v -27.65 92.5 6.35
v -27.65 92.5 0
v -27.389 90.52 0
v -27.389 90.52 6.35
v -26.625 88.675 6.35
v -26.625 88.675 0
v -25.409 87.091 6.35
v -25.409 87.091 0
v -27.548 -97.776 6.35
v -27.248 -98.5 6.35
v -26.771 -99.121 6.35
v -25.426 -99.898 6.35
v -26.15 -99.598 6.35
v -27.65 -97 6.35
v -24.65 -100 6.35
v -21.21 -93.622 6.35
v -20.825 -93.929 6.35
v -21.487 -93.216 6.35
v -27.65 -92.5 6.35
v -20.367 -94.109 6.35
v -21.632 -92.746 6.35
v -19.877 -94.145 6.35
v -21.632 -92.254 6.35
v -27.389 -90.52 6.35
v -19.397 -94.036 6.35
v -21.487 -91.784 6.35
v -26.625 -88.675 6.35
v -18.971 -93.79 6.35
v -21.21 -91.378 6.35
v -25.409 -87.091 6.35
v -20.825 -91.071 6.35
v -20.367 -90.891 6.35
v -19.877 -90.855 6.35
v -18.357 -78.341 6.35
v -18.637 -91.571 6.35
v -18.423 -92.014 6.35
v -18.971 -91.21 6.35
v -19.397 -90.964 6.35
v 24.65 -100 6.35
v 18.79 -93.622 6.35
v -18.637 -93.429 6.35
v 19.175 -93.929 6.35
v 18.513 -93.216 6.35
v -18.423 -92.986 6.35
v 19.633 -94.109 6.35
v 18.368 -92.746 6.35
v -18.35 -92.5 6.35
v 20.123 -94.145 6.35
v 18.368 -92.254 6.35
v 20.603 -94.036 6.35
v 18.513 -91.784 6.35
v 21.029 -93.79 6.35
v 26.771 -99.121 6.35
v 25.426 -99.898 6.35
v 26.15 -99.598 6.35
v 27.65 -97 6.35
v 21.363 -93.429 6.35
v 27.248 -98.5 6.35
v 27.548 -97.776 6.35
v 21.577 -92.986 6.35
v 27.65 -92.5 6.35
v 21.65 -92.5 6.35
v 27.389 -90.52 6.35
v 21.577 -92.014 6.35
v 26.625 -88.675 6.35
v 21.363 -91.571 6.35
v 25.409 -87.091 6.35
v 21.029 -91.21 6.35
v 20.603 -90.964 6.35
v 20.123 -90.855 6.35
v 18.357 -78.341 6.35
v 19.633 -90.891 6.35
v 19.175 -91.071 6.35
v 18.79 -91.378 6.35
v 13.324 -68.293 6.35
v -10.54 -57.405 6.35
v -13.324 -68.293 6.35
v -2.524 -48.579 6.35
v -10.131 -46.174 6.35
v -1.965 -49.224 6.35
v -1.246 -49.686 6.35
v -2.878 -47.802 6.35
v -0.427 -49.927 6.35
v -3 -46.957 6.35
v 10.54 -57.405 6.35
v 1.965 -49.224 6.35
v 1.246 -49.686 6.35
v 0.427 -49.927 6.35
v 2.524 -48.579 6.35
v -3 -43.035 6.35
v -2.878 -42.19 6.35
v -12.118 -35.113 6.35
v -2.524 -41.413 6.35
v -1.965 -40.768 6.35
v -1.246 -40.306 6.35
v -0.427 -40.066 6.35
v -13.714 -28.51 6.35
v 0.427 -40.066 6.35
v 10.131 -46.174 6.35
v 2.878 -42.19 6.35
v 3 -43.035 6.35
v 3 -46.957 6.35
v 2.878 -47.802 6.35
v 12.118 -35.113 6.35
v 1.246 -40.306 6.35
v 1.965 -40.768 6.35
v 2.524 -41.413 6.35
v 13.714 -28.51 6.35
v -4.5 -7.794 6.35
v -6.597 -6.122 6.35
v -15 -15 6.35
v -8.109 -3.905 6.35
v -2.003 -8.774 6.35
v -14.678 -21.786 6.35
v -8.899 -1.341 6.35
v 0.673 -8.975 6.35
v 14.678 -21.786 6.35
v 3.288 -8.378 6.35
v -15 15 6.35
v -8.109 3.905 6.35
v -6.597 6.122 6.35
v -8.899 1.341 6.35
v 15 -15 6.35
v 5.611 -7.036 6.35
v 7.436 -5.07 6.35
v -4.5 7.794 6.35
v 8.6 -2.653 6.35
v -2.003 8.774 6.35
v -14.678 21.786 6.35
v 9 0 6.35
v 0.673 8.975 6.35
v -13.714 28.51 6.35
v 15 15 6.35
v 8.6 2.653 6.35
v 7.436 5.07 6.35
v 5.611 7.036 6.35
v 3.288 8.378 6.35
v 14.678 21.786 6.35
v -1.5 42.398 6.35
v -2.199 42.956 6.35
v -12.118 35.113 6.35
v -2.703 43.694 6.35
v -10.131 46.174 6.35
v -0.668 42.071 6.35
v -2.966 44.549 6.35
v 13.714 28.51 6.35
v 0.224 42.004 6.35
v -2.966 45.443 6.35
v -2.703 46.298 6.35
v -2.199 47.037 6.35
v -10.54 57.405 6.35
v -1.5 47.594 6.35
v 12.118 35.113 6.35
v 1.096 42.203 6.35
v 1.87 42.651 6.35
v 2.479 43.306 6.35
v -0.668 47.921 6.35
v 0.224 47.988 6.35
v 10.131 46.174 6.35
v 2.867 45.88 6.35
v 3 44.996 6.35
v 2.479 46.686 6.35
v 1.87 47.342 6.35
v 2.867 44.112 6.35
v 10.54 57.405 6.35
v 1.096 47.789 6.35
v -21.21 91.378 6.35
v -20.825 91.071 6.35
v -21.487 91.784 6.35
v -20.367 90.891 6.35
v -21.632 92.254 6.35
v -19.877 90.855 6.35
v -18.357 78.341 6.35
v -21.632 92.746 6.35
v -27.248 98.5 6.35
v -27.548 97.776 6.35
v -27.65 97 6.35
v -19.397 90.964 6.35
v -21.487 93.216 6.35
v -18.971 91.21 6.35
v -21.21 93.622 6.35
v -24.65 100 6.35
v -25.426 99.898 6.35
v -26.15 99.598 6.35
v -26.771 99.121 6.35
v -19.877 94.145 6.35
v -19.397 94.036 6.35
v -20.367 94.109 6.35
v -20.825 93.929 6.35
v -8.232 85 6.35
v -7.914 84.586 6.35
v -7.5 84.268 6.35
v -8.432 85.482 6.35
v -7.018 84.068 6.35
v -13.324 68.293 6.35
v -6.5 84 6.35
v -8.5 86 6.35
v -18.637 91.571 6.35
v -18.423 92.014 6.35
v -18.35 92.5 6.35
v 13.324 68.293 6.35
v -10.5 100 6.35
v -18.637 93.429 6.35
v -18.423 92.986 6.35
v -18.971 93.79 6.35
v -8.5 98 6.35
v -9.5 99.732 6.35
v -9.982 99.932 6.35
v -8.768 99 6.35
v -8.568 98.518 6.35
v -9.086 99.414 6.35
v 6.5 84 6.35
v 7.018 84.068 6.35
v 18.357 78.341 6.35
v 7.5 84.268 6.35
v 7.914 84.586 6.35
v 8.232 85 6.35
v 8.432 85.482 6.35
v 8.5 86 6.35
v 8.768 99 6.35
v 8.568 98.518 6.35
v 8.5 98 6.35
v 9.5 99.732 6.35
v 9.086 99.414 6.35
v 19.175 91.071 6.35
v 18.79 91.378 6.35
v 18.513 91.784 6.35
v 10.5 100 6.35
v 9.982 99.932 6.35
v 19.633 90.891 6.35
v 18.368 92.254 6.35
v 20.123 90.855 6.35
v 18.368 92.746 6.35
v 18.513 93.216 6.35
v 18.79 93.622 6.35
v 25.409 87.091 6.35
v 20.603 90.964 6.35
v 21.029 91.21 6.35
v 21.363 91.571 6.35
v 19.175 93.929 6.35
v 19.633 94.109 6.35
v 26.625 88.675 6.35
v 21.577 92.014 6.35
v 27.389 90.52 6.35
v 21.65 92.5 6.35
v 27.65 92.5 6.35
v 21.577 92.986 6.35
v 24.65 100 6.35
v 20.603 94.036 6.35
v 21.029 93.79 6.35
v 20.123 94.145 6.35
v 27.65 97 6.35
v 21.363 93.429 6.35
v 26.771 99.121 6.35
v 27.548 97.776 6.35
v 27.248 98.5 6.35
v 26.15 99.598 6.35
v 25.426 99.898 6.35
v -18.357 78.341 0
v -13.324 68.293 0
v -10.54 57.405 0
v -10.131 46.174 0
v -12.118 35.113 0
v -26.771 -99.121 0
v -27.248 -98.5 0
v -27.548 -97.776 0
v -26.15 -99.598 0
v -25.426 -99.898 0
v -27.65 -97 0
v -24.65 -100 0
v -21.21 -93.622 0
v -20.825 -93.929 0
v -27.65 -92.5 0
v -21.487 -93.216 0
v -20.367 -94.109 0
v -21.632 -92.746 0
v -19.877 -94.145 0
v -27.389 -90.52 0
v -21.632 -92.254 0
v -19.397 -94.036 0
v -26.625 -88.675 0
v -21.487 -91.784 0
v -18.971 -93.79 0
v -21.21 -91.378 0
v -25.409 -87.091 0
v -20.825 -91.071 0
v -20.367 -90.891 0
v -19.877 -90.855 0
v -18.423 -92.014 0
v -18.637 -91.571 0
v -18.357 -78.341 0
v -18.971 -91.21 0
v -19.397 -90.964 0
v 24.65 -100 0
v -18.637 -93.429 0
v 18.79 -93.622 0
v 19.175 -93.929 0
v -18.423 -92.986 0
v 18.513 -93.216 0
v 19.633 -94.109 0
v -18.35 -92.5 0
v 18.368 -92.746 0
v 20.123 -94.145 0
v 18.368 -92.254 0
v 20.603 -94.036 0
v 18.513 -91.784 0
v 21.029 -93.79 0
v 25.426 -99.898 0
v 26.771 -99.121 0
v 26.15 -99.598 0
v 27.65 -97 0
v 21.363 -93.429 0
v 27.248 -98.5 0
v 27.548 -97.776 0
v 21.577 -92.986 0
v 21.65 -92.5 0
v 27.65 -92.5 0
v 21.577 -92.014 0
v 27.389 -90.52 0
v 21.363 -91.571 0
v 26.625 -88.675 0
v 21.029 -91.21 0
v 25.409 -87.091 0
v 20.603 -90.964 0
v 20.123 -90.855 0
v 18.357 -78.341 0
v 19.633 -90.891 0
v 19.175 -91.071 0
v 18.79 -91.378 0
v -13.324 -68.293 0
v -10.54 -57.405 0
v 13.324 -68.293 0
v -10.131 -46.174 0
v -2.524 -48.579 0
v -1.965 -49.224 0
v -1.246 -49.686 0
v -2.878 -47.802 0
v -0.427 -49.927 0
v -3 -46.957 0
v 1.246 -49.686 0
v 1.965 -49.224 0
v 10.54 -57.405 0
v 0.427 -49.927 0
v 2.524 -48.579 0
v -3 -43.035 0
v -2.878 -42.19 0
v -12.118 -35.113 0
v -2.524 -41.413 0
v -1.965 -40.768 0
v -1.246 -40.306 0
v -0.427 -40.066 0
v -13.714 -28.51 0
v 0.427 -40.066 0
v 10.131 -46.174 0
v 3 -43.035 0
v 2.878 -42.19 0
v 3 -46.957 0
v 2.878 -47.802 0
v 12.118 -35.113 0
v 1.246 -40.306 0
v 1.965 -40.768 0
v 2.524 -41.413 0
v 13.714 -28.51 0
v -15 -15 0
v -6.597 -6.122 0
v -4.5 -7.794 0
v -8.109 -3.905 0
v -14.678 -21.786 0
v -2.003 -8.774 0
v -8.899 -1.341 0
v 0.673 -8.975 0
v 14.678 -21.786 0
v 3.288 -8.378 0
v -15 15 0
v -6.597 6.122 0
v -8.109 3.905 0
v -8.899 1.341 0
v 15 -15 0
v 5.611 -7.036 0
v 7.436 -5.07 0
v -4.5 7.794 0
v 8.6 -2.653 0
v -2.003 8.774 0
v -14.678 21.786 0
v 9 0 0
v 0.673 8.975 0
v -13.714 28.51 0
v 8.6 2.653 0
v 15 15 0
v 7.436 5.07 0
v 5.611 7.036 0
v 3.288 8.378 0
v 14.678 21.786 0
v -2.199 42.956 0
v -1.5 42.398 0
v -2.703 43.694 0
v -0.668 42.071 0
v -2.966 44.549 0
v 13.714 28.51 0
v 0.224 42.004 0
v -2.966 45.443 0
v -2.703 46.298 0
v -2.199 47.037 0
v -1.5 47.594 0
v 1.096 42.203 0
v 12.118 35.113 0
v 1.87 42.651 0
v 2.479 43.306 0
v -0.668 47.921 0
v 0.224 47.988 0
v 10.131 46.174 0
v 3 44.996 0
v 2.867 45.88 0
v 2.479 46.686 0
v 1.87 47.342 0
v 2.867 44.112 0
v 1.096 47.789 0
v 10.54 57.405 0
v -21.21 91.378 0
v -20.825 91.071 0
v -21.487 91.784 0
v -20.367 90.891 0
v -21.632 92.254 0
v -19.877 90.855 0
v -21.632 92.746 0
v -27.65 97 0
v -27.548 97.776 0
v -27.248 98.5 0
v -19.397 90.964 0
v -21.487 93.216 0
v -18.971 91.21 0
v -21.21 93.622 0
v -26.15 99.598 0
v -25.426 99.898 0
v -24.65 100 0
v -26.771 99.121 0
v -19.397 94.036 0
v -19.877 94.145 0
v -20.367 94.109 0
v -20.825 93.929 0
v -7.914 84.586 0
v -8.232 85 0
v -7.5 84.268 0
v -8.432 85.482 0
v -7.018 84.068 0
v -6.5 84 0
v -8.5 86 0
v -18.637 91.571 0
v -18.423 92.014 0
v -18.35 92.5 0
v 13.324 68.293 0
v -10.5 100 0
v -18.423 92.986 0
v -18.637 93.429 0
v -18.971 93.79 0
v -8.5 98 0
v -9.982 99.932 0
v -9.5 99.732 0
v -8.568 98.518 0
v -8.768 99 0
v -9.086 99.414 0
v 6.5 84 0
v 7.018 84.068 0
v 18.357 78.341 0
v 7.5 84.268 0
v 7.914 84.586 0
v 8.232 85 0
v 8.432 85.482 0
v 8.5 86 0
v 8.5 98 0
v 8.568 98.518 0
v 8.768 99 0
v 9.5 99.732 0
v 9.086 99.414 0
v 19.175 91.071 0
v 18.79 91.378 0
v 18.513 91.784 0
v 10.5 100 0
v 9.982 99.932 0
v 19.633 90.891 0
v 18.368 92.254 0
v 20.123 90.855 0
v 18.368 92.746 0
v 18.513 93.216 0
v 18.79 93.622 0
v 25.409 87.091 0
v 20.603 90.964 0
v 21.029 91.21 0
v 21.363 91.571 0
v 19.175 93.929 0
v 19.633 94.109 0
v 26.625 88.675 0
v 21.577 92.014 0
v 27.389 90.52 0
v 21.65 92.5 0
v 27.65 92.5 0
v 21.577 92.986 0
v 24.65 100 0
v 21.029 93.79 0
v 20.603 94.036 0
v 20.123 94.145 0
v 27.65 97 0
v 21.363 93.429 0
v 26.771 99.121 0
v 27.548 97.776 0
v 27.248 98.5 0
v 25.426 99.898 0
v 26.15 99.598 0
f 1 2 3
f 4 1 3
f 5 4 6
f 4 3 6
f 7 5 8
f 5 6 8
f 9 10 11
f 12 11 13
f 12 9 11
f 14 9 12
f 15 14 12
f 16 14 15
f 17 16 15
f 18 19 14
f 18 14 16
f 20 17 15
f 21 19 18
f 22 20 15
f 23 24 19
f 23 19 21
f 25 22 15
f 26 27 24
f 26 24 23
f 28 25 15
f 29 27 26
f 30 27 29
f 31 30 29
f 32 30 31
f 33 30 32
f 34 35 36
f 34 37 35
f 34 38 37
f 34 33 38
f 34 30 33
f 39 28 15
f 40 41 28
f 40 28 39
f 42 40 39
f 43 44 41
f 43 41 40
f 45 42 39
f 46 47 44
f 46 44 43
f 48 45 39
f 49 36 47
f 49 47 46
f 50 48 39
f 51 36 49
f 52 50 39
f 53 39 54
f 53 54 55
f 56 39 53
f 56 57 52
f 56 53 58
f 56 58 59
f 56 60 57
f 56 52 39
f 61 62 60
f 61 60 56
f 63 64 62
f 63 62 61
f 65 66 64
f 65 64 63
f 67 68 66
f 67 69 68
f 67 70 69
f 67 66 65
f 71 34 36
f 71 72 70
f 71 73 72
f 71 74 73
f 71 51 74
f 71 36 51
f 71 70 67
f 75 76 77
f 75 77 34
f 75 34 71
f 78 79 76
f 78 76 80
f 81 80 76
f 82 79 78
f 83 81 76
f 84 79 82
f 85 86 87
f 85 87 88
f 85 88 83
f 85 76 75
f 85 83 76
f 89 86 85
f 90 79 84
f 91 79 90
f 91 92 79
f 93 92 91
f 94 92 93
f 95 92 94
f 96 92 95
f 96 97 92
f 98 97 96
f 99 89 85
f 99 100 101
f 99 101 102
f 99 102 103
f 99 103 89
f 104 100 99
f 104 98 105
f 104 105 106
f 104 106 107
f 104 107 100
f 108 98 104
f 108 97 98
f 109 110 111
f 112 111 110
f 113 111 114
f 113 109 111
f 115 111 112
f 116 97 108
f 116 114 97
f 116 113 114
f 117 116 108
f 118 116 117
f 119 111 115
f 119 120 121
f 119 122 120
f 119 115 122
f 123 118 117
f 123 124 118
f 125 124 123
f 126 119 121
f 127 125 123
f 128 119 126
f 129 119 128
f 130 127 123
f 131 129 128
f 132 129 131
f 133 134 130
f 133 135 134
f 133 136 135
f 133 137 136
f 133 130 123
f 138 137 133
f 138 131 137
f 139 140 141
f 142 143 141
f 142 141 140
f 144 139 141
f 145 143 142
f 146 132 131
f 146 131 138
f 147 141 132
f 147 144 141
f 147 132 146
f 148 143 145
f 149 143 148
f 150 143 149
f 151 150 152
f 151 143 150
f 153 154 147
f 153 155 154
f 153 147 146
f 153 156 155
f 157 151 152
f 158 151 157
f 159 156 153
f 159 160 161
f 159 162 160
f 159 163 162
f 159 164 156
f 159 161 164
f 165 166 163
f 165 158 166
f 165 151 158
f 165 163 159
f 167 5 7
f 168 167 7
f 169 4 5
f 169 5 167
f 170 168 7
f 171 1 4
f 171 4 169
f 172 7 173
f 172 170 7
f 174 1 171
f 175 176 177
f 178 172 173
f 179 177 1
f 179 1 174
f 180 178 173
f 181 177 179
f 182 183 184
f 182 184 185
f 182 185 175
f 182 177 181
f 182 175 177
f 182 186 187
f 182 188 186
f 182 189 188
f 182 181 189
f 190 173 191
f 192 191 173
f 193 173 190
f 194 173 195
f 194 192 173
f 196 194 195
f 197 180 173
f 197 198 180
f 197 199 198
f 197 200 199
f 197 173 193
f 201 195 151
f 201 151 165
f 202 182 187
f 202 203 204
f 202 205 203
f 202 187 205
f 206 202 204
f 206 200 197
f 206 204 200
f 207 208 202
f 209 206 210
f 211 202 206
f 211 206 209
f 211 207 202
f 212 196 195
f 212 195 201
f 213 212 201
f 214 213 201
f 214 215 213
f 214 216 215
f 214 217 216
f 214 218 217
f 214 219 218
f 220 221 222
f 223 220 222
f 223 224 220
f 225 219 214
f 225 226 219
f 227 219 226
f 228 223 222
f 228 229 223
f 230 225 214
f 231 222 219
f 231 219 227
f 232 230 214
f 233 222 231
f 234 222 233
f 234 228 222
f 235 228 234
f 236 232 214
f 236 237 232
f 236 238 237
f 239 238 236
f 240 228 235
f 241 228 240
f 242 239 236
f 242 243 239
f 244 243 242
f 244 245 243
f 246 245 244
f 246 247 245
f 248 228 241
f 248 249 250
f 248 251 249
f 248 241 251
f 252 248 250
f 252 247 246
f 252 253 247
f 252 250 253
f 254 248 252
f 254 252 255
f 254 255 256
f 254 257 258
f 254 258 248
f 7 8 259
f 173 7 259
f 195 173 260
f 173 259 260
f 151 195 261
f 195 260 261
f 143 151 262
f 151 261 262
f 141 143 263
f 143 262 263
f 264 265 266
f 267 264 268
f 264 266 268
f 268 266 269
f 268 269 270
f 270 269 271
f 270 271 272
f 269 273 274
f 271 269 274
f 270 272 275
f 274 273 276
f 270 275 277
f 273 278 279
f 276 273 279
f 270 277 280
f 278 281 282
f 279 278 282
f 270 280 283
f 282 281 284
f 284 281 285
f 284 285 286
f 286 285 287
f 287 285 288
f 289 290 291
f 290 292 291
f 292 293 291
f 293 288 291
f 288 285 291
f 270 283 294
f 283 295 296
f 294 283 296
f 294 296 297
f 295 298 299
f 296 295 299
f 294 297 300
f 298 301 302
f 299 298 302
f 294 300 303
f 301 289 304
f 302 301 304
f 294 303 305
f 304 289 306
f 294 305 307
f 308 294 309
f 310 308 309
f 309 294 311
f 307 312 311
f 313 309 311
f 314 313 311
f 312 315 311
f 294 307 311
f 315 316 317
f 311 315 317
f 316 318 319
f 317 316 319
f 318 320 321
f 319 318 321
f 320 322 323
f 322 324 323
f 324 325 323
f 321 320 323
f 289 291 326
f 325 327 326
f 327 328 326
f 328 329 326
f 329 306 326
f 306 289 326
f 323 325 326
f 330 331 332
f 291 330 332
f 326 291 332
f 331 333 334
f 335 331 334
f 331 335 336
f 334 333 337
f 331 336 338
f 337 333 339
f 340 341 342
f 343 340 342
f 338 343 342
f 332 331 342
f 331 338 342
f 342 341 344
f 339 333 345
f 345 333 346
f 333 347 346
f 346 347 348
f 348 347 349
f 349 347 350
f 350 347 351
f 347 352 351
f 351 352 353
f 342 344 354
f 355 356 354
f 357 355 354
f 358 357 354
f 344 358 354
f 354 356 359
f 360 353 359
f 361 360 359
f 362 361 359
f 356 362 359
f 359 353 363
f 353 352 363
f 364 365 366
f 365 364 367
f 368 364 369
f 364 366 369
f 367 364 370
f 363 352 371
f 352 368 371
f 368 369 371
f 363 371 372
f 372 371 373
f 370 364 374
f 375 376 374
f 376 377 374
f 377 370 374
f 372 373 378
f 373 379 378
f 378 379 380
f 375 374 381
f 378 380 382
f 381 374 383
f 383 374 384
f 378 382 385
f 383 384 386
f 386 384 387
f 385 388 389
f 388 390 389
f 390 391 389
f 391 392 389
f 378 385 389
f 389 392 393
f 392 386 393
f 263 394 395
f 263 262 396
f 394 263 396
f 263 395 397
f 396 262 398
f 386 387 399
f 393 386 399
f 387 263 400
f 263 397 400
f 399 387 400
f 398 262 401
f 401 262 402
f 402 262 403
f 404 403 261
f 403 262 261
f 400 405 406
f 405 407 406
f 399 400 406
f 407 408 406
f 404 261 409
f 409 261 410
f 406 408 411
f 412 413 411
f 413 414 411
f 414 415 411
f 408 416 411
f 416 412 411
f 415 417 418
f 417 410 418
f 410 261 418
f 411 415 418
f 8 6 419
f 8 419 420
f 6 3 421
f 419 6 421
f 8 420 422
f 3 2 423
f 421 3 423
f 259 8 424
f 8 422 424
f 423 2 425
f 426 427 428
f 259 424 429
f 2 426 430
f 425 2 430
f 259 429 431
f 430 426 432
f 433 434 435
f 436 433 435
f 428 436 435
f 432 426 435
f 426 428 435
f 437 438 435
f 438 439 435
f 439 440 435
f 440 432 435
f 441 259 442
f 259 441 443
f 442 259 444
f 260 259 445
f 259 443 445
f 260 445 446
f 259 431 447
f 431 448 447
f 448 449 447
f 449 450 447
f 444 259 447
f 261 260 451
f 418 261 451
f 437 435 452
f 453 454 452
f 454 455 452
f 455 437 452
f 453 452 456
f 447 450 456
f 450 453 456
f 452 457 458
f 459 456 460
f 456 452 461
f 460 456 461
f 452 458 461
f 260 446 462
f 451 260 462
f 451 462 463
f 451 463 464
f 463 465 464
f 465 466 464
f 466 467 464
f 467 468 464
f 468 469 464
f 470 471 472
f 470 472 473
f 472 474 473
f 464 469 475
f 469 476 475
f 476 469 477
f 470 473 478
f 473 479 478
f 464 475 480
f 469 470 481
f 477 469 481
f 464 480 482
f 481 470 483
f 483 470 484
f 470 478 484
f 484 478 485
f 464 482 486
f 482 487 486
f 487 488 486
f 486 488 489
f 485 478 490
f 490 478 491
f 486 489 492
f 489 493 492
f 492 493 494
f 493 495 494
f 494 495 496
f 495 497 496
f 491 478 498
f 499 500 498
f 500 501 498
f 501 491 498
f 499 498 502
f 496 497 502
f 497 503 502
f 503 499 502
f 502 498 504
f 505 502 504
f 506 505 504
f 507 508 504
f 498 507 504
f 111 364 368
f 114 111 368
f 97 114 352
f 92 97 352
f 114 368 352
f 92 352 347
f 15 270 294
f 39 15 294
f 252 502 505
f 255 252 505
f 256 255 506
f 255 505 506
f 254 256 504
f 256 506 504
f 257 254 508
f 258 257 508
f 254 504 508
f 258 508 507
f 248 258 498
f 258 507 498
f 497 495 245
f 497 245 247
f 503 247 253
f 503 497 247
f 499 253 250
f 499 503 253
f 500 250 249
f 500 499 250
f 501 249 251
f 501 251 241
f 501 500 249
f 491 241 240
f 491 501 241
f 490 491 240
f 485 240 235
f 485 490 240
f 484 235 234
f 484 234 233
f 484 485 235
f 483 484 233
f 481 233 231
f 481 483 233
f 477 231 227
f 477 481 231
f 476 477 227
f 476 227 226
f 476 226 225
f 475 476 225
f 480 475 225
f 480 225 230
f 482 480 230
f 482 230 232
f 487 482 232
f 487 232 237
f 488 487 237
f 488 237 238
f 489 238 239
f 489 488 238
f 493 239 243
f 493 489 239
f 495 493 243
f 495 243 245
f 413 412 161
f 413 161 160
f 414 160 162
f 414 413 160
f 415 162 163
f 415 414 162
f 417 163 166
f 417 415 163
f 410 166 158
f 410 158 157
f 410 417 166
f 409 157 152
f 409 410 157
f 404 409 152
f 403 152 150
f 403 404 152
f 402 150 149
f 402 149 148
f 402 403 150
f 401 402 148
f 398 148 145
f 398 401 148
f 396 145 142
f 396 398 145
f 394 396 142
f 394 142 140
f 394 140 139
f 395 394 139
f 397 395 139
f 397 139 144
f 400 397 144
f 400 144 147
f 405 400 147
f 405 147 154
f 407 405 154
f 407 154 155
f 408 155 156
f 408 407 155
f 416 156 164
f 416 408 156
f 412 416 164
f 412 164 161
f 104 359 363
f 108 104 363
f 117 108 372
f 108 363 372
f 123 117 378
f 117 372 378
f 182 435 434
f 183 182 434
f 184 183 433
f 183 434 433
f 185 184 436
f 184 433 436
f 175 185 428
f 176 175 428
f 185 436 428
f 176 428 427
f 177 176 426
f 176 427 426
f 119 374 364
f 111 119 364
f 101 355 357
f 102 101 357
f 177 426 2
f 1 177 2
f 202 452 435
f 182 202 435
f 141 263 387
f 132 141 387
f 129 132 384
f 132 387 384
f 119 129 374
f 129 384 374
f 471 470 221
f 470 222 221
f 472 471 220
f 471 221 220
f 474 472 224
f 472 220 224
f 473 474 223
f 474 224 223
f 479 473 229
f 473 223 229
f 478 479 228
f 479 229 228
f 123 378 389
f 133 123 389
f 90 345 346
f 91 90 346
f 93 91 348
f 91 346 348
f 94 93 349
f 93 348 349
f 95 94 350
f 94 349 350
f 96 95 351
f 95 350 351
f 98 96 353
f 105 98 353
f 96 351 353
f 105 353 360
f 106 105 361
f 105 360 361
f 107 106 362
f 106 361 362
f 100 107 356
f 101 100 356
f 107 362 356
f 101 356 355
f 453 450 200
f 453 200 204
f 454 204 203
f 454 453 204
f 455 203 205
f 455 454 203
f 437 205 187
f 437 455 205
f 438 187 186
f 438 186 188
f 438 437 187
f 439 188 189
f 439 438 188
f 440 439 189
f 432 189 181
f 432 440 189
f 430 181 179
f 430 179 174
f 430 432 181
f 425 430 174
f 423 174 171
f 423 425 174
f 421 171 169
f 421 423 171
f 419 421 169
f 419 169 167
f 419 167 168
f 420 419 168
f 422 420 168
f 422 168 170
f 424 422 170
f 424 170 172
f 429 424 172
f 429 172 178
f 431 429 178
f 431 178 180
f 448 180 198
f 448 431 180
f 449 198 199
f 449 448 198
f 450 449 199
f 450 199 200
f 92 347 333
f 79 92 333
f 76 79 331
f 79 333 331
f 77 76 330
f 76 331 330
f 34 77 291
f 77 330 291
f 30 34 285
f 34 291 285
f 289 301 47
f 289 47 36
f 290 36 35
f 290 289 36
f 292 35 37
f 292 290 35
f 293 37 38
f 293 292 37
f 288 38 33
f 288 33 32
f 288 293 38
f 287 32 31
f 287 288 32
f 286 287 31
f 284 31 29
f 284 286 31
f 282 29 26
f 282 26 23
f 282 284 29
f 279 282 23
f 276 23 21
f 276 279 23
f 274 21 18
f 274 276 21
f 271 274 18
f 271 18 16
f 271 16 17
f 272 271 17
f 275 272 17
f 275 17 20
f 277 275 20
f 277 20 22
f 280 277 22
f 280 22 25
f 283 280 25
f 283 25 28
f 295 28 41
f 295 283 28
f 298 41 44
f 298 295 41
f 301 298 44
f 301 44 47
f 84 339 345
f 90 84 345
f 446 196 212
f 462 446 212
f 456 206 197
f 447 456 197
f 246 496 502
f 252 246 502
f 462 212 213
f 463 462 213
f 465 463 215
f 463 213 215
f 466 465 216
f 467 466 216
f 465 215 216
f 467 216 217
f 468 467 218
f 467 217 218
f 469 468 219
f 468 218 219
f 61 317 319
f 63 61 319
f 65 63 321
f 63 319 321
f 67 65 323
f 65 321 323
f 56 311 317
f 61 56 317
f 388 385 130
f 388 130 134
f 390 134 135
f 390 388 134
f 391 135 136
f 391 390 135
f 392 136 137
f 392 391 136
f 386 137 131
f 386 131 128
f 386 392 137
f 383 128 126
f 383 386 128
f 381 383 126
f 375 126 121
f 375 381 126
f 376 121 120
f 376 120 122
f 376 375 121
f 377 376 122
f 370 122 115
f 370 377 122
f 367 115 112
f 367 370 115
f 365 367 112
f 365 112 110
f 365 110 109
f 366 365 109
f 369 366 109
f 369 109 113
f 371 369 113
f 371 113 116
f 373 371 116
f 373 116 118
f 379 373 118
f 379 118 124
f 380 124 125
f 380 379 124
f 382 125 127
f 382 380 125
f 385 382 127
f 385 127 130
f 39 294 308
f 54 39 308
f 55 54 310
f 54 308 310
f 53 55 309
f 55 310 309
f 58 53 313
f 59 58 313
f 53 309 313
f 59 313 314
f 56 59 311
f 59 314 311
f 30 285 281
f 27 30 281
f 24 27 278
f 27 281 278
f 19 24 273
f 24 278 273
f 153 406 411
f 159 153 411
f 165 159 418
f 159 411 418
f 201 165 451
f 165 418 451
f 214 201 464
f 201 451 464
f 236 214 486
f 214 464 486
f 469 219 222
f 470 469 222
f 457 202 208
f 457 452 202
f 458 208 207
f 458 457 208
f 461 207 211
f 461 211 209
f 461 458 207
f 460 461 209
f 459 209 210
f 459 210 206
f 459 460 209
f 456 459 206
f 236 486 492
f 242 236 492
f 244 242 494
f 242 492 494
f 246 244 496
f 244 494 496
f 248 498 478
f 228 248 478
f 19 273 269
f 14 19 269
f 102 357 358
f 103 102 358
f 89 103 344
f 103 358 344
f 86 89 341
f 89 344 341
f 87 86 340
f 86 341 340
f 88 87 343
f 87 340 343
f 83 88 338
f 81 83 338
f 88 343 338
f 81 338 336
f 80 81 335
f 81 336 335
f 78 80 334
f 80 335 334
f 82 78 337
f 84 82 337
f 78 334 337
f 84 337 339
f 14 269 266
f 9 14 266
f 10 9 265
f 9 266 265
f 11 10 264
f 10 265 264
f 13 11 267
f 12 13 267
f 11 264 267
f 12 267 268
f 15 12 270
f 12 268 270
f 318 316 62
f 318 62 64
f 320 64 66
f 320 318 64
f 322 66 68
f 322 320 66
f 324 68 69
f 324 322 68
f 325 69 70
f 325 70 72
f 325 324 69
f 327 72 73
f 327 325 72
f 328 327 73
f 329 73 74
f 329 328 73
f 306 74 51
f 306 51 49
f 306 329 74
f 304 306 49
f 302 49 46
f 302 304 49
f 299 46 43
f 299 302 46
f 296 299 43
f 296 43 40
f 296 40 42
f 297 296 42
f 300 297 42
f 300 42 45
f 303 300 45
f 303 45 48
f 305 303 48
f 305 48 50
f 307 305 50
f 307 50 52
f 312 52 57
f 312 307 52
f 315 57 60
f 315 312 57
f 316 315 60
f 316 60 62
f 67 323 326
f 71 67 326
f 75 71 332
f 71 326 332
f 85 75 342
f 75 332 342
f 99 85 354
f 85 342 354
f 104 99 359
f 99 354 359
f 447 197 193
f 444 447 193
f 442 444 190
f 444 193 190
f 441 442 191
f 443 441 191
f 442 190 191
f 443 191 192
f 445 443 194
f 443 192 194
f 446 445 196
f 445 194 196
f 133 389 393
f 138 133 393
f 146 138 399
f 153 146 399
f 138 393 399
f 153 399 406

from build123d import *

# Parameters (mm, degrees)
SKETCH1_R           = 9
SKETCH1_R_2         = 3
SKETCH1_R_3         = 1.65
BOSS_EXTRUDE1_DEPTH = 6.35
CUT_EXTRUDE1_DEPTH  = 10
FILLET1_R           = 2


with BuildPart() as part:
    # Sketch1 → Boss-Extrude1 (new body)
    with BuildSketch(Plane.XY):
        with BuildLine():
            Line((-15, 15), (-15, -15))
            ThreePointArc((-15, -15), (-14.275727836, -25.159324804), (-12.117561222, -35.113156605))
            ThreePointArc((-12.117561222, -35.113156605), (-11.640196728, -62.923473964), (-25.409366876, -87.090633124))
            ThreePointArc((-25.409366876, -87.090633124), (-27.067678424, -89.572471742), (-27.65, -92.5))
            Line((-27.65, -92.5), (-27.65, -97))
            ThreePointArc((-27.65, -97), (-26.771320344, -99.121320344), (-24.65, -100))
            Line((-24.65, -100), (24.65, -100))
            ThreePointArc((24.65, -100), (26.771320344, -99.121320344), (27.65, -97))
            Line((27.65, -97), (27.65, -92.5))
            ThreePointArc((27.65, -92.5), (27.067678424, -89.572471742), (25.409366876, -87.090633124))
            ThreePointArc((25.409366876, -87.090633124), (11.640196728, -62.923473964), (12.117561222, -35.113156605))
            ThreePointArc((12.117561222, -35.113156605), (14.275727836, -25.159324804), (15, -15))
            Line((15, -15), (15, 15))
            ThreePointArc((15, 15), (14.275727836, 25.159324804), (12.117561222, 35.113156605))
            ThreePointArc((12.117561222, 35.113156605), (11.640196728, 62.923473964), (25.409366876, 87.090633124))
            ThreePointArc((25.409366876, 87.090633124), (27.067678424, 89.572471742), (27.65, 92.5))
            Line((27.65, 92.5), (27.65, 97))
            ThreePointArc((27.65, 97), (26.771320344, 99.121320344), (24.65, 100))
            Line((24.65, 100), (-24.65, 100))
            ThreePointArc((-24.65, 100), (-26.771320344, 99.121320344), (-27.65, 97))
            Line((-27.65, 97), (-27.65, 92.5))
            ThreePointArc((-27.65, 92.5), (-27.067678424, 89.572471742), (-25.409366876, 87.090633124))
            ThreePointArc((-25.409366876, 87.090633124), (-11.640196728, 62.923473964), (-12.117561222, 35.113156605))
            ThreePointArc((-12.117561222, 35.113156605), (-14.275727836, 25.159324804), (-15, 15))
        make_face()
        Circle(SKETCH1_R, mode=Mode.SUBTRACT)
        with Locations((0, 44.9961)):
            Circle(SKETCH1_R_2, mode=Mode.SUBTRACT)
        with Locations((20, 92.5)):
            Circle(SKETCH1_R_3, mode=Mode.SUBTRACT)
        with Locations((-20, 92.5)):
            Circle(SKETCH1_R_3, mode=Mode.SUBTRACT)
        with Locations((-20, -92.5)):
            Circle(SKETCH1_R_3, mode=Mode.SUBTRACT)
        with Locations((20, -92.5)):
            Circle(SKETCH1_R_3, mode=Mode.SUBTRACT)
        with BuildLine():
            Line((3, -43.0351625), (3, -46.9570375))
            ThreePointArc((3, -46.9570375), (0, -49.9570375), (-3, -46.9570375))
            Line((-3, -46.9570375), (-3, -43.0351625))
            ThreePointArc((-3, -43.0351625), (0, -40.0351625), (3, -43.0351625))
        make_face(mode=Mode.SUBTRACT)
    extrude(amount=BOSS_EXTRUDE1_DEPTH)

    # Sketch3 → Cut-Extrude1 (cut)
    with BuildSketch(Plane.XY.offset(6.35)):
        with BuildLine():
            Line((-8.5, 101), (-8.5, 86))
            ThreePointArc((-8.5, 86), (-7.914213562, 84.585786438), (-6.5, 84))
            Line((-6.5, 84), (6.5, 84))
            ThreePointArc((6.5, 84), (7.914213562, 84.585786438), (8.5, 86))
            Line((8.5, 86), (8.5, 101))
            Line((8.5, 101), (-8.5, 101))
        make_face()
    extrude(amount=-CUT_EXTRUDE1_DEPTH, mode=Mode.SUBTRACT)

    # Fillet1
    fillet1_edges = [part.edges().sort_by_distance(p)[0] for p in [
        (-8.5, 100, 3.175),
        (8.5, 100, 3.175),
    ]]
    fillet(fillet1_edges, radius=FILLET1_R)


solid = part.part
